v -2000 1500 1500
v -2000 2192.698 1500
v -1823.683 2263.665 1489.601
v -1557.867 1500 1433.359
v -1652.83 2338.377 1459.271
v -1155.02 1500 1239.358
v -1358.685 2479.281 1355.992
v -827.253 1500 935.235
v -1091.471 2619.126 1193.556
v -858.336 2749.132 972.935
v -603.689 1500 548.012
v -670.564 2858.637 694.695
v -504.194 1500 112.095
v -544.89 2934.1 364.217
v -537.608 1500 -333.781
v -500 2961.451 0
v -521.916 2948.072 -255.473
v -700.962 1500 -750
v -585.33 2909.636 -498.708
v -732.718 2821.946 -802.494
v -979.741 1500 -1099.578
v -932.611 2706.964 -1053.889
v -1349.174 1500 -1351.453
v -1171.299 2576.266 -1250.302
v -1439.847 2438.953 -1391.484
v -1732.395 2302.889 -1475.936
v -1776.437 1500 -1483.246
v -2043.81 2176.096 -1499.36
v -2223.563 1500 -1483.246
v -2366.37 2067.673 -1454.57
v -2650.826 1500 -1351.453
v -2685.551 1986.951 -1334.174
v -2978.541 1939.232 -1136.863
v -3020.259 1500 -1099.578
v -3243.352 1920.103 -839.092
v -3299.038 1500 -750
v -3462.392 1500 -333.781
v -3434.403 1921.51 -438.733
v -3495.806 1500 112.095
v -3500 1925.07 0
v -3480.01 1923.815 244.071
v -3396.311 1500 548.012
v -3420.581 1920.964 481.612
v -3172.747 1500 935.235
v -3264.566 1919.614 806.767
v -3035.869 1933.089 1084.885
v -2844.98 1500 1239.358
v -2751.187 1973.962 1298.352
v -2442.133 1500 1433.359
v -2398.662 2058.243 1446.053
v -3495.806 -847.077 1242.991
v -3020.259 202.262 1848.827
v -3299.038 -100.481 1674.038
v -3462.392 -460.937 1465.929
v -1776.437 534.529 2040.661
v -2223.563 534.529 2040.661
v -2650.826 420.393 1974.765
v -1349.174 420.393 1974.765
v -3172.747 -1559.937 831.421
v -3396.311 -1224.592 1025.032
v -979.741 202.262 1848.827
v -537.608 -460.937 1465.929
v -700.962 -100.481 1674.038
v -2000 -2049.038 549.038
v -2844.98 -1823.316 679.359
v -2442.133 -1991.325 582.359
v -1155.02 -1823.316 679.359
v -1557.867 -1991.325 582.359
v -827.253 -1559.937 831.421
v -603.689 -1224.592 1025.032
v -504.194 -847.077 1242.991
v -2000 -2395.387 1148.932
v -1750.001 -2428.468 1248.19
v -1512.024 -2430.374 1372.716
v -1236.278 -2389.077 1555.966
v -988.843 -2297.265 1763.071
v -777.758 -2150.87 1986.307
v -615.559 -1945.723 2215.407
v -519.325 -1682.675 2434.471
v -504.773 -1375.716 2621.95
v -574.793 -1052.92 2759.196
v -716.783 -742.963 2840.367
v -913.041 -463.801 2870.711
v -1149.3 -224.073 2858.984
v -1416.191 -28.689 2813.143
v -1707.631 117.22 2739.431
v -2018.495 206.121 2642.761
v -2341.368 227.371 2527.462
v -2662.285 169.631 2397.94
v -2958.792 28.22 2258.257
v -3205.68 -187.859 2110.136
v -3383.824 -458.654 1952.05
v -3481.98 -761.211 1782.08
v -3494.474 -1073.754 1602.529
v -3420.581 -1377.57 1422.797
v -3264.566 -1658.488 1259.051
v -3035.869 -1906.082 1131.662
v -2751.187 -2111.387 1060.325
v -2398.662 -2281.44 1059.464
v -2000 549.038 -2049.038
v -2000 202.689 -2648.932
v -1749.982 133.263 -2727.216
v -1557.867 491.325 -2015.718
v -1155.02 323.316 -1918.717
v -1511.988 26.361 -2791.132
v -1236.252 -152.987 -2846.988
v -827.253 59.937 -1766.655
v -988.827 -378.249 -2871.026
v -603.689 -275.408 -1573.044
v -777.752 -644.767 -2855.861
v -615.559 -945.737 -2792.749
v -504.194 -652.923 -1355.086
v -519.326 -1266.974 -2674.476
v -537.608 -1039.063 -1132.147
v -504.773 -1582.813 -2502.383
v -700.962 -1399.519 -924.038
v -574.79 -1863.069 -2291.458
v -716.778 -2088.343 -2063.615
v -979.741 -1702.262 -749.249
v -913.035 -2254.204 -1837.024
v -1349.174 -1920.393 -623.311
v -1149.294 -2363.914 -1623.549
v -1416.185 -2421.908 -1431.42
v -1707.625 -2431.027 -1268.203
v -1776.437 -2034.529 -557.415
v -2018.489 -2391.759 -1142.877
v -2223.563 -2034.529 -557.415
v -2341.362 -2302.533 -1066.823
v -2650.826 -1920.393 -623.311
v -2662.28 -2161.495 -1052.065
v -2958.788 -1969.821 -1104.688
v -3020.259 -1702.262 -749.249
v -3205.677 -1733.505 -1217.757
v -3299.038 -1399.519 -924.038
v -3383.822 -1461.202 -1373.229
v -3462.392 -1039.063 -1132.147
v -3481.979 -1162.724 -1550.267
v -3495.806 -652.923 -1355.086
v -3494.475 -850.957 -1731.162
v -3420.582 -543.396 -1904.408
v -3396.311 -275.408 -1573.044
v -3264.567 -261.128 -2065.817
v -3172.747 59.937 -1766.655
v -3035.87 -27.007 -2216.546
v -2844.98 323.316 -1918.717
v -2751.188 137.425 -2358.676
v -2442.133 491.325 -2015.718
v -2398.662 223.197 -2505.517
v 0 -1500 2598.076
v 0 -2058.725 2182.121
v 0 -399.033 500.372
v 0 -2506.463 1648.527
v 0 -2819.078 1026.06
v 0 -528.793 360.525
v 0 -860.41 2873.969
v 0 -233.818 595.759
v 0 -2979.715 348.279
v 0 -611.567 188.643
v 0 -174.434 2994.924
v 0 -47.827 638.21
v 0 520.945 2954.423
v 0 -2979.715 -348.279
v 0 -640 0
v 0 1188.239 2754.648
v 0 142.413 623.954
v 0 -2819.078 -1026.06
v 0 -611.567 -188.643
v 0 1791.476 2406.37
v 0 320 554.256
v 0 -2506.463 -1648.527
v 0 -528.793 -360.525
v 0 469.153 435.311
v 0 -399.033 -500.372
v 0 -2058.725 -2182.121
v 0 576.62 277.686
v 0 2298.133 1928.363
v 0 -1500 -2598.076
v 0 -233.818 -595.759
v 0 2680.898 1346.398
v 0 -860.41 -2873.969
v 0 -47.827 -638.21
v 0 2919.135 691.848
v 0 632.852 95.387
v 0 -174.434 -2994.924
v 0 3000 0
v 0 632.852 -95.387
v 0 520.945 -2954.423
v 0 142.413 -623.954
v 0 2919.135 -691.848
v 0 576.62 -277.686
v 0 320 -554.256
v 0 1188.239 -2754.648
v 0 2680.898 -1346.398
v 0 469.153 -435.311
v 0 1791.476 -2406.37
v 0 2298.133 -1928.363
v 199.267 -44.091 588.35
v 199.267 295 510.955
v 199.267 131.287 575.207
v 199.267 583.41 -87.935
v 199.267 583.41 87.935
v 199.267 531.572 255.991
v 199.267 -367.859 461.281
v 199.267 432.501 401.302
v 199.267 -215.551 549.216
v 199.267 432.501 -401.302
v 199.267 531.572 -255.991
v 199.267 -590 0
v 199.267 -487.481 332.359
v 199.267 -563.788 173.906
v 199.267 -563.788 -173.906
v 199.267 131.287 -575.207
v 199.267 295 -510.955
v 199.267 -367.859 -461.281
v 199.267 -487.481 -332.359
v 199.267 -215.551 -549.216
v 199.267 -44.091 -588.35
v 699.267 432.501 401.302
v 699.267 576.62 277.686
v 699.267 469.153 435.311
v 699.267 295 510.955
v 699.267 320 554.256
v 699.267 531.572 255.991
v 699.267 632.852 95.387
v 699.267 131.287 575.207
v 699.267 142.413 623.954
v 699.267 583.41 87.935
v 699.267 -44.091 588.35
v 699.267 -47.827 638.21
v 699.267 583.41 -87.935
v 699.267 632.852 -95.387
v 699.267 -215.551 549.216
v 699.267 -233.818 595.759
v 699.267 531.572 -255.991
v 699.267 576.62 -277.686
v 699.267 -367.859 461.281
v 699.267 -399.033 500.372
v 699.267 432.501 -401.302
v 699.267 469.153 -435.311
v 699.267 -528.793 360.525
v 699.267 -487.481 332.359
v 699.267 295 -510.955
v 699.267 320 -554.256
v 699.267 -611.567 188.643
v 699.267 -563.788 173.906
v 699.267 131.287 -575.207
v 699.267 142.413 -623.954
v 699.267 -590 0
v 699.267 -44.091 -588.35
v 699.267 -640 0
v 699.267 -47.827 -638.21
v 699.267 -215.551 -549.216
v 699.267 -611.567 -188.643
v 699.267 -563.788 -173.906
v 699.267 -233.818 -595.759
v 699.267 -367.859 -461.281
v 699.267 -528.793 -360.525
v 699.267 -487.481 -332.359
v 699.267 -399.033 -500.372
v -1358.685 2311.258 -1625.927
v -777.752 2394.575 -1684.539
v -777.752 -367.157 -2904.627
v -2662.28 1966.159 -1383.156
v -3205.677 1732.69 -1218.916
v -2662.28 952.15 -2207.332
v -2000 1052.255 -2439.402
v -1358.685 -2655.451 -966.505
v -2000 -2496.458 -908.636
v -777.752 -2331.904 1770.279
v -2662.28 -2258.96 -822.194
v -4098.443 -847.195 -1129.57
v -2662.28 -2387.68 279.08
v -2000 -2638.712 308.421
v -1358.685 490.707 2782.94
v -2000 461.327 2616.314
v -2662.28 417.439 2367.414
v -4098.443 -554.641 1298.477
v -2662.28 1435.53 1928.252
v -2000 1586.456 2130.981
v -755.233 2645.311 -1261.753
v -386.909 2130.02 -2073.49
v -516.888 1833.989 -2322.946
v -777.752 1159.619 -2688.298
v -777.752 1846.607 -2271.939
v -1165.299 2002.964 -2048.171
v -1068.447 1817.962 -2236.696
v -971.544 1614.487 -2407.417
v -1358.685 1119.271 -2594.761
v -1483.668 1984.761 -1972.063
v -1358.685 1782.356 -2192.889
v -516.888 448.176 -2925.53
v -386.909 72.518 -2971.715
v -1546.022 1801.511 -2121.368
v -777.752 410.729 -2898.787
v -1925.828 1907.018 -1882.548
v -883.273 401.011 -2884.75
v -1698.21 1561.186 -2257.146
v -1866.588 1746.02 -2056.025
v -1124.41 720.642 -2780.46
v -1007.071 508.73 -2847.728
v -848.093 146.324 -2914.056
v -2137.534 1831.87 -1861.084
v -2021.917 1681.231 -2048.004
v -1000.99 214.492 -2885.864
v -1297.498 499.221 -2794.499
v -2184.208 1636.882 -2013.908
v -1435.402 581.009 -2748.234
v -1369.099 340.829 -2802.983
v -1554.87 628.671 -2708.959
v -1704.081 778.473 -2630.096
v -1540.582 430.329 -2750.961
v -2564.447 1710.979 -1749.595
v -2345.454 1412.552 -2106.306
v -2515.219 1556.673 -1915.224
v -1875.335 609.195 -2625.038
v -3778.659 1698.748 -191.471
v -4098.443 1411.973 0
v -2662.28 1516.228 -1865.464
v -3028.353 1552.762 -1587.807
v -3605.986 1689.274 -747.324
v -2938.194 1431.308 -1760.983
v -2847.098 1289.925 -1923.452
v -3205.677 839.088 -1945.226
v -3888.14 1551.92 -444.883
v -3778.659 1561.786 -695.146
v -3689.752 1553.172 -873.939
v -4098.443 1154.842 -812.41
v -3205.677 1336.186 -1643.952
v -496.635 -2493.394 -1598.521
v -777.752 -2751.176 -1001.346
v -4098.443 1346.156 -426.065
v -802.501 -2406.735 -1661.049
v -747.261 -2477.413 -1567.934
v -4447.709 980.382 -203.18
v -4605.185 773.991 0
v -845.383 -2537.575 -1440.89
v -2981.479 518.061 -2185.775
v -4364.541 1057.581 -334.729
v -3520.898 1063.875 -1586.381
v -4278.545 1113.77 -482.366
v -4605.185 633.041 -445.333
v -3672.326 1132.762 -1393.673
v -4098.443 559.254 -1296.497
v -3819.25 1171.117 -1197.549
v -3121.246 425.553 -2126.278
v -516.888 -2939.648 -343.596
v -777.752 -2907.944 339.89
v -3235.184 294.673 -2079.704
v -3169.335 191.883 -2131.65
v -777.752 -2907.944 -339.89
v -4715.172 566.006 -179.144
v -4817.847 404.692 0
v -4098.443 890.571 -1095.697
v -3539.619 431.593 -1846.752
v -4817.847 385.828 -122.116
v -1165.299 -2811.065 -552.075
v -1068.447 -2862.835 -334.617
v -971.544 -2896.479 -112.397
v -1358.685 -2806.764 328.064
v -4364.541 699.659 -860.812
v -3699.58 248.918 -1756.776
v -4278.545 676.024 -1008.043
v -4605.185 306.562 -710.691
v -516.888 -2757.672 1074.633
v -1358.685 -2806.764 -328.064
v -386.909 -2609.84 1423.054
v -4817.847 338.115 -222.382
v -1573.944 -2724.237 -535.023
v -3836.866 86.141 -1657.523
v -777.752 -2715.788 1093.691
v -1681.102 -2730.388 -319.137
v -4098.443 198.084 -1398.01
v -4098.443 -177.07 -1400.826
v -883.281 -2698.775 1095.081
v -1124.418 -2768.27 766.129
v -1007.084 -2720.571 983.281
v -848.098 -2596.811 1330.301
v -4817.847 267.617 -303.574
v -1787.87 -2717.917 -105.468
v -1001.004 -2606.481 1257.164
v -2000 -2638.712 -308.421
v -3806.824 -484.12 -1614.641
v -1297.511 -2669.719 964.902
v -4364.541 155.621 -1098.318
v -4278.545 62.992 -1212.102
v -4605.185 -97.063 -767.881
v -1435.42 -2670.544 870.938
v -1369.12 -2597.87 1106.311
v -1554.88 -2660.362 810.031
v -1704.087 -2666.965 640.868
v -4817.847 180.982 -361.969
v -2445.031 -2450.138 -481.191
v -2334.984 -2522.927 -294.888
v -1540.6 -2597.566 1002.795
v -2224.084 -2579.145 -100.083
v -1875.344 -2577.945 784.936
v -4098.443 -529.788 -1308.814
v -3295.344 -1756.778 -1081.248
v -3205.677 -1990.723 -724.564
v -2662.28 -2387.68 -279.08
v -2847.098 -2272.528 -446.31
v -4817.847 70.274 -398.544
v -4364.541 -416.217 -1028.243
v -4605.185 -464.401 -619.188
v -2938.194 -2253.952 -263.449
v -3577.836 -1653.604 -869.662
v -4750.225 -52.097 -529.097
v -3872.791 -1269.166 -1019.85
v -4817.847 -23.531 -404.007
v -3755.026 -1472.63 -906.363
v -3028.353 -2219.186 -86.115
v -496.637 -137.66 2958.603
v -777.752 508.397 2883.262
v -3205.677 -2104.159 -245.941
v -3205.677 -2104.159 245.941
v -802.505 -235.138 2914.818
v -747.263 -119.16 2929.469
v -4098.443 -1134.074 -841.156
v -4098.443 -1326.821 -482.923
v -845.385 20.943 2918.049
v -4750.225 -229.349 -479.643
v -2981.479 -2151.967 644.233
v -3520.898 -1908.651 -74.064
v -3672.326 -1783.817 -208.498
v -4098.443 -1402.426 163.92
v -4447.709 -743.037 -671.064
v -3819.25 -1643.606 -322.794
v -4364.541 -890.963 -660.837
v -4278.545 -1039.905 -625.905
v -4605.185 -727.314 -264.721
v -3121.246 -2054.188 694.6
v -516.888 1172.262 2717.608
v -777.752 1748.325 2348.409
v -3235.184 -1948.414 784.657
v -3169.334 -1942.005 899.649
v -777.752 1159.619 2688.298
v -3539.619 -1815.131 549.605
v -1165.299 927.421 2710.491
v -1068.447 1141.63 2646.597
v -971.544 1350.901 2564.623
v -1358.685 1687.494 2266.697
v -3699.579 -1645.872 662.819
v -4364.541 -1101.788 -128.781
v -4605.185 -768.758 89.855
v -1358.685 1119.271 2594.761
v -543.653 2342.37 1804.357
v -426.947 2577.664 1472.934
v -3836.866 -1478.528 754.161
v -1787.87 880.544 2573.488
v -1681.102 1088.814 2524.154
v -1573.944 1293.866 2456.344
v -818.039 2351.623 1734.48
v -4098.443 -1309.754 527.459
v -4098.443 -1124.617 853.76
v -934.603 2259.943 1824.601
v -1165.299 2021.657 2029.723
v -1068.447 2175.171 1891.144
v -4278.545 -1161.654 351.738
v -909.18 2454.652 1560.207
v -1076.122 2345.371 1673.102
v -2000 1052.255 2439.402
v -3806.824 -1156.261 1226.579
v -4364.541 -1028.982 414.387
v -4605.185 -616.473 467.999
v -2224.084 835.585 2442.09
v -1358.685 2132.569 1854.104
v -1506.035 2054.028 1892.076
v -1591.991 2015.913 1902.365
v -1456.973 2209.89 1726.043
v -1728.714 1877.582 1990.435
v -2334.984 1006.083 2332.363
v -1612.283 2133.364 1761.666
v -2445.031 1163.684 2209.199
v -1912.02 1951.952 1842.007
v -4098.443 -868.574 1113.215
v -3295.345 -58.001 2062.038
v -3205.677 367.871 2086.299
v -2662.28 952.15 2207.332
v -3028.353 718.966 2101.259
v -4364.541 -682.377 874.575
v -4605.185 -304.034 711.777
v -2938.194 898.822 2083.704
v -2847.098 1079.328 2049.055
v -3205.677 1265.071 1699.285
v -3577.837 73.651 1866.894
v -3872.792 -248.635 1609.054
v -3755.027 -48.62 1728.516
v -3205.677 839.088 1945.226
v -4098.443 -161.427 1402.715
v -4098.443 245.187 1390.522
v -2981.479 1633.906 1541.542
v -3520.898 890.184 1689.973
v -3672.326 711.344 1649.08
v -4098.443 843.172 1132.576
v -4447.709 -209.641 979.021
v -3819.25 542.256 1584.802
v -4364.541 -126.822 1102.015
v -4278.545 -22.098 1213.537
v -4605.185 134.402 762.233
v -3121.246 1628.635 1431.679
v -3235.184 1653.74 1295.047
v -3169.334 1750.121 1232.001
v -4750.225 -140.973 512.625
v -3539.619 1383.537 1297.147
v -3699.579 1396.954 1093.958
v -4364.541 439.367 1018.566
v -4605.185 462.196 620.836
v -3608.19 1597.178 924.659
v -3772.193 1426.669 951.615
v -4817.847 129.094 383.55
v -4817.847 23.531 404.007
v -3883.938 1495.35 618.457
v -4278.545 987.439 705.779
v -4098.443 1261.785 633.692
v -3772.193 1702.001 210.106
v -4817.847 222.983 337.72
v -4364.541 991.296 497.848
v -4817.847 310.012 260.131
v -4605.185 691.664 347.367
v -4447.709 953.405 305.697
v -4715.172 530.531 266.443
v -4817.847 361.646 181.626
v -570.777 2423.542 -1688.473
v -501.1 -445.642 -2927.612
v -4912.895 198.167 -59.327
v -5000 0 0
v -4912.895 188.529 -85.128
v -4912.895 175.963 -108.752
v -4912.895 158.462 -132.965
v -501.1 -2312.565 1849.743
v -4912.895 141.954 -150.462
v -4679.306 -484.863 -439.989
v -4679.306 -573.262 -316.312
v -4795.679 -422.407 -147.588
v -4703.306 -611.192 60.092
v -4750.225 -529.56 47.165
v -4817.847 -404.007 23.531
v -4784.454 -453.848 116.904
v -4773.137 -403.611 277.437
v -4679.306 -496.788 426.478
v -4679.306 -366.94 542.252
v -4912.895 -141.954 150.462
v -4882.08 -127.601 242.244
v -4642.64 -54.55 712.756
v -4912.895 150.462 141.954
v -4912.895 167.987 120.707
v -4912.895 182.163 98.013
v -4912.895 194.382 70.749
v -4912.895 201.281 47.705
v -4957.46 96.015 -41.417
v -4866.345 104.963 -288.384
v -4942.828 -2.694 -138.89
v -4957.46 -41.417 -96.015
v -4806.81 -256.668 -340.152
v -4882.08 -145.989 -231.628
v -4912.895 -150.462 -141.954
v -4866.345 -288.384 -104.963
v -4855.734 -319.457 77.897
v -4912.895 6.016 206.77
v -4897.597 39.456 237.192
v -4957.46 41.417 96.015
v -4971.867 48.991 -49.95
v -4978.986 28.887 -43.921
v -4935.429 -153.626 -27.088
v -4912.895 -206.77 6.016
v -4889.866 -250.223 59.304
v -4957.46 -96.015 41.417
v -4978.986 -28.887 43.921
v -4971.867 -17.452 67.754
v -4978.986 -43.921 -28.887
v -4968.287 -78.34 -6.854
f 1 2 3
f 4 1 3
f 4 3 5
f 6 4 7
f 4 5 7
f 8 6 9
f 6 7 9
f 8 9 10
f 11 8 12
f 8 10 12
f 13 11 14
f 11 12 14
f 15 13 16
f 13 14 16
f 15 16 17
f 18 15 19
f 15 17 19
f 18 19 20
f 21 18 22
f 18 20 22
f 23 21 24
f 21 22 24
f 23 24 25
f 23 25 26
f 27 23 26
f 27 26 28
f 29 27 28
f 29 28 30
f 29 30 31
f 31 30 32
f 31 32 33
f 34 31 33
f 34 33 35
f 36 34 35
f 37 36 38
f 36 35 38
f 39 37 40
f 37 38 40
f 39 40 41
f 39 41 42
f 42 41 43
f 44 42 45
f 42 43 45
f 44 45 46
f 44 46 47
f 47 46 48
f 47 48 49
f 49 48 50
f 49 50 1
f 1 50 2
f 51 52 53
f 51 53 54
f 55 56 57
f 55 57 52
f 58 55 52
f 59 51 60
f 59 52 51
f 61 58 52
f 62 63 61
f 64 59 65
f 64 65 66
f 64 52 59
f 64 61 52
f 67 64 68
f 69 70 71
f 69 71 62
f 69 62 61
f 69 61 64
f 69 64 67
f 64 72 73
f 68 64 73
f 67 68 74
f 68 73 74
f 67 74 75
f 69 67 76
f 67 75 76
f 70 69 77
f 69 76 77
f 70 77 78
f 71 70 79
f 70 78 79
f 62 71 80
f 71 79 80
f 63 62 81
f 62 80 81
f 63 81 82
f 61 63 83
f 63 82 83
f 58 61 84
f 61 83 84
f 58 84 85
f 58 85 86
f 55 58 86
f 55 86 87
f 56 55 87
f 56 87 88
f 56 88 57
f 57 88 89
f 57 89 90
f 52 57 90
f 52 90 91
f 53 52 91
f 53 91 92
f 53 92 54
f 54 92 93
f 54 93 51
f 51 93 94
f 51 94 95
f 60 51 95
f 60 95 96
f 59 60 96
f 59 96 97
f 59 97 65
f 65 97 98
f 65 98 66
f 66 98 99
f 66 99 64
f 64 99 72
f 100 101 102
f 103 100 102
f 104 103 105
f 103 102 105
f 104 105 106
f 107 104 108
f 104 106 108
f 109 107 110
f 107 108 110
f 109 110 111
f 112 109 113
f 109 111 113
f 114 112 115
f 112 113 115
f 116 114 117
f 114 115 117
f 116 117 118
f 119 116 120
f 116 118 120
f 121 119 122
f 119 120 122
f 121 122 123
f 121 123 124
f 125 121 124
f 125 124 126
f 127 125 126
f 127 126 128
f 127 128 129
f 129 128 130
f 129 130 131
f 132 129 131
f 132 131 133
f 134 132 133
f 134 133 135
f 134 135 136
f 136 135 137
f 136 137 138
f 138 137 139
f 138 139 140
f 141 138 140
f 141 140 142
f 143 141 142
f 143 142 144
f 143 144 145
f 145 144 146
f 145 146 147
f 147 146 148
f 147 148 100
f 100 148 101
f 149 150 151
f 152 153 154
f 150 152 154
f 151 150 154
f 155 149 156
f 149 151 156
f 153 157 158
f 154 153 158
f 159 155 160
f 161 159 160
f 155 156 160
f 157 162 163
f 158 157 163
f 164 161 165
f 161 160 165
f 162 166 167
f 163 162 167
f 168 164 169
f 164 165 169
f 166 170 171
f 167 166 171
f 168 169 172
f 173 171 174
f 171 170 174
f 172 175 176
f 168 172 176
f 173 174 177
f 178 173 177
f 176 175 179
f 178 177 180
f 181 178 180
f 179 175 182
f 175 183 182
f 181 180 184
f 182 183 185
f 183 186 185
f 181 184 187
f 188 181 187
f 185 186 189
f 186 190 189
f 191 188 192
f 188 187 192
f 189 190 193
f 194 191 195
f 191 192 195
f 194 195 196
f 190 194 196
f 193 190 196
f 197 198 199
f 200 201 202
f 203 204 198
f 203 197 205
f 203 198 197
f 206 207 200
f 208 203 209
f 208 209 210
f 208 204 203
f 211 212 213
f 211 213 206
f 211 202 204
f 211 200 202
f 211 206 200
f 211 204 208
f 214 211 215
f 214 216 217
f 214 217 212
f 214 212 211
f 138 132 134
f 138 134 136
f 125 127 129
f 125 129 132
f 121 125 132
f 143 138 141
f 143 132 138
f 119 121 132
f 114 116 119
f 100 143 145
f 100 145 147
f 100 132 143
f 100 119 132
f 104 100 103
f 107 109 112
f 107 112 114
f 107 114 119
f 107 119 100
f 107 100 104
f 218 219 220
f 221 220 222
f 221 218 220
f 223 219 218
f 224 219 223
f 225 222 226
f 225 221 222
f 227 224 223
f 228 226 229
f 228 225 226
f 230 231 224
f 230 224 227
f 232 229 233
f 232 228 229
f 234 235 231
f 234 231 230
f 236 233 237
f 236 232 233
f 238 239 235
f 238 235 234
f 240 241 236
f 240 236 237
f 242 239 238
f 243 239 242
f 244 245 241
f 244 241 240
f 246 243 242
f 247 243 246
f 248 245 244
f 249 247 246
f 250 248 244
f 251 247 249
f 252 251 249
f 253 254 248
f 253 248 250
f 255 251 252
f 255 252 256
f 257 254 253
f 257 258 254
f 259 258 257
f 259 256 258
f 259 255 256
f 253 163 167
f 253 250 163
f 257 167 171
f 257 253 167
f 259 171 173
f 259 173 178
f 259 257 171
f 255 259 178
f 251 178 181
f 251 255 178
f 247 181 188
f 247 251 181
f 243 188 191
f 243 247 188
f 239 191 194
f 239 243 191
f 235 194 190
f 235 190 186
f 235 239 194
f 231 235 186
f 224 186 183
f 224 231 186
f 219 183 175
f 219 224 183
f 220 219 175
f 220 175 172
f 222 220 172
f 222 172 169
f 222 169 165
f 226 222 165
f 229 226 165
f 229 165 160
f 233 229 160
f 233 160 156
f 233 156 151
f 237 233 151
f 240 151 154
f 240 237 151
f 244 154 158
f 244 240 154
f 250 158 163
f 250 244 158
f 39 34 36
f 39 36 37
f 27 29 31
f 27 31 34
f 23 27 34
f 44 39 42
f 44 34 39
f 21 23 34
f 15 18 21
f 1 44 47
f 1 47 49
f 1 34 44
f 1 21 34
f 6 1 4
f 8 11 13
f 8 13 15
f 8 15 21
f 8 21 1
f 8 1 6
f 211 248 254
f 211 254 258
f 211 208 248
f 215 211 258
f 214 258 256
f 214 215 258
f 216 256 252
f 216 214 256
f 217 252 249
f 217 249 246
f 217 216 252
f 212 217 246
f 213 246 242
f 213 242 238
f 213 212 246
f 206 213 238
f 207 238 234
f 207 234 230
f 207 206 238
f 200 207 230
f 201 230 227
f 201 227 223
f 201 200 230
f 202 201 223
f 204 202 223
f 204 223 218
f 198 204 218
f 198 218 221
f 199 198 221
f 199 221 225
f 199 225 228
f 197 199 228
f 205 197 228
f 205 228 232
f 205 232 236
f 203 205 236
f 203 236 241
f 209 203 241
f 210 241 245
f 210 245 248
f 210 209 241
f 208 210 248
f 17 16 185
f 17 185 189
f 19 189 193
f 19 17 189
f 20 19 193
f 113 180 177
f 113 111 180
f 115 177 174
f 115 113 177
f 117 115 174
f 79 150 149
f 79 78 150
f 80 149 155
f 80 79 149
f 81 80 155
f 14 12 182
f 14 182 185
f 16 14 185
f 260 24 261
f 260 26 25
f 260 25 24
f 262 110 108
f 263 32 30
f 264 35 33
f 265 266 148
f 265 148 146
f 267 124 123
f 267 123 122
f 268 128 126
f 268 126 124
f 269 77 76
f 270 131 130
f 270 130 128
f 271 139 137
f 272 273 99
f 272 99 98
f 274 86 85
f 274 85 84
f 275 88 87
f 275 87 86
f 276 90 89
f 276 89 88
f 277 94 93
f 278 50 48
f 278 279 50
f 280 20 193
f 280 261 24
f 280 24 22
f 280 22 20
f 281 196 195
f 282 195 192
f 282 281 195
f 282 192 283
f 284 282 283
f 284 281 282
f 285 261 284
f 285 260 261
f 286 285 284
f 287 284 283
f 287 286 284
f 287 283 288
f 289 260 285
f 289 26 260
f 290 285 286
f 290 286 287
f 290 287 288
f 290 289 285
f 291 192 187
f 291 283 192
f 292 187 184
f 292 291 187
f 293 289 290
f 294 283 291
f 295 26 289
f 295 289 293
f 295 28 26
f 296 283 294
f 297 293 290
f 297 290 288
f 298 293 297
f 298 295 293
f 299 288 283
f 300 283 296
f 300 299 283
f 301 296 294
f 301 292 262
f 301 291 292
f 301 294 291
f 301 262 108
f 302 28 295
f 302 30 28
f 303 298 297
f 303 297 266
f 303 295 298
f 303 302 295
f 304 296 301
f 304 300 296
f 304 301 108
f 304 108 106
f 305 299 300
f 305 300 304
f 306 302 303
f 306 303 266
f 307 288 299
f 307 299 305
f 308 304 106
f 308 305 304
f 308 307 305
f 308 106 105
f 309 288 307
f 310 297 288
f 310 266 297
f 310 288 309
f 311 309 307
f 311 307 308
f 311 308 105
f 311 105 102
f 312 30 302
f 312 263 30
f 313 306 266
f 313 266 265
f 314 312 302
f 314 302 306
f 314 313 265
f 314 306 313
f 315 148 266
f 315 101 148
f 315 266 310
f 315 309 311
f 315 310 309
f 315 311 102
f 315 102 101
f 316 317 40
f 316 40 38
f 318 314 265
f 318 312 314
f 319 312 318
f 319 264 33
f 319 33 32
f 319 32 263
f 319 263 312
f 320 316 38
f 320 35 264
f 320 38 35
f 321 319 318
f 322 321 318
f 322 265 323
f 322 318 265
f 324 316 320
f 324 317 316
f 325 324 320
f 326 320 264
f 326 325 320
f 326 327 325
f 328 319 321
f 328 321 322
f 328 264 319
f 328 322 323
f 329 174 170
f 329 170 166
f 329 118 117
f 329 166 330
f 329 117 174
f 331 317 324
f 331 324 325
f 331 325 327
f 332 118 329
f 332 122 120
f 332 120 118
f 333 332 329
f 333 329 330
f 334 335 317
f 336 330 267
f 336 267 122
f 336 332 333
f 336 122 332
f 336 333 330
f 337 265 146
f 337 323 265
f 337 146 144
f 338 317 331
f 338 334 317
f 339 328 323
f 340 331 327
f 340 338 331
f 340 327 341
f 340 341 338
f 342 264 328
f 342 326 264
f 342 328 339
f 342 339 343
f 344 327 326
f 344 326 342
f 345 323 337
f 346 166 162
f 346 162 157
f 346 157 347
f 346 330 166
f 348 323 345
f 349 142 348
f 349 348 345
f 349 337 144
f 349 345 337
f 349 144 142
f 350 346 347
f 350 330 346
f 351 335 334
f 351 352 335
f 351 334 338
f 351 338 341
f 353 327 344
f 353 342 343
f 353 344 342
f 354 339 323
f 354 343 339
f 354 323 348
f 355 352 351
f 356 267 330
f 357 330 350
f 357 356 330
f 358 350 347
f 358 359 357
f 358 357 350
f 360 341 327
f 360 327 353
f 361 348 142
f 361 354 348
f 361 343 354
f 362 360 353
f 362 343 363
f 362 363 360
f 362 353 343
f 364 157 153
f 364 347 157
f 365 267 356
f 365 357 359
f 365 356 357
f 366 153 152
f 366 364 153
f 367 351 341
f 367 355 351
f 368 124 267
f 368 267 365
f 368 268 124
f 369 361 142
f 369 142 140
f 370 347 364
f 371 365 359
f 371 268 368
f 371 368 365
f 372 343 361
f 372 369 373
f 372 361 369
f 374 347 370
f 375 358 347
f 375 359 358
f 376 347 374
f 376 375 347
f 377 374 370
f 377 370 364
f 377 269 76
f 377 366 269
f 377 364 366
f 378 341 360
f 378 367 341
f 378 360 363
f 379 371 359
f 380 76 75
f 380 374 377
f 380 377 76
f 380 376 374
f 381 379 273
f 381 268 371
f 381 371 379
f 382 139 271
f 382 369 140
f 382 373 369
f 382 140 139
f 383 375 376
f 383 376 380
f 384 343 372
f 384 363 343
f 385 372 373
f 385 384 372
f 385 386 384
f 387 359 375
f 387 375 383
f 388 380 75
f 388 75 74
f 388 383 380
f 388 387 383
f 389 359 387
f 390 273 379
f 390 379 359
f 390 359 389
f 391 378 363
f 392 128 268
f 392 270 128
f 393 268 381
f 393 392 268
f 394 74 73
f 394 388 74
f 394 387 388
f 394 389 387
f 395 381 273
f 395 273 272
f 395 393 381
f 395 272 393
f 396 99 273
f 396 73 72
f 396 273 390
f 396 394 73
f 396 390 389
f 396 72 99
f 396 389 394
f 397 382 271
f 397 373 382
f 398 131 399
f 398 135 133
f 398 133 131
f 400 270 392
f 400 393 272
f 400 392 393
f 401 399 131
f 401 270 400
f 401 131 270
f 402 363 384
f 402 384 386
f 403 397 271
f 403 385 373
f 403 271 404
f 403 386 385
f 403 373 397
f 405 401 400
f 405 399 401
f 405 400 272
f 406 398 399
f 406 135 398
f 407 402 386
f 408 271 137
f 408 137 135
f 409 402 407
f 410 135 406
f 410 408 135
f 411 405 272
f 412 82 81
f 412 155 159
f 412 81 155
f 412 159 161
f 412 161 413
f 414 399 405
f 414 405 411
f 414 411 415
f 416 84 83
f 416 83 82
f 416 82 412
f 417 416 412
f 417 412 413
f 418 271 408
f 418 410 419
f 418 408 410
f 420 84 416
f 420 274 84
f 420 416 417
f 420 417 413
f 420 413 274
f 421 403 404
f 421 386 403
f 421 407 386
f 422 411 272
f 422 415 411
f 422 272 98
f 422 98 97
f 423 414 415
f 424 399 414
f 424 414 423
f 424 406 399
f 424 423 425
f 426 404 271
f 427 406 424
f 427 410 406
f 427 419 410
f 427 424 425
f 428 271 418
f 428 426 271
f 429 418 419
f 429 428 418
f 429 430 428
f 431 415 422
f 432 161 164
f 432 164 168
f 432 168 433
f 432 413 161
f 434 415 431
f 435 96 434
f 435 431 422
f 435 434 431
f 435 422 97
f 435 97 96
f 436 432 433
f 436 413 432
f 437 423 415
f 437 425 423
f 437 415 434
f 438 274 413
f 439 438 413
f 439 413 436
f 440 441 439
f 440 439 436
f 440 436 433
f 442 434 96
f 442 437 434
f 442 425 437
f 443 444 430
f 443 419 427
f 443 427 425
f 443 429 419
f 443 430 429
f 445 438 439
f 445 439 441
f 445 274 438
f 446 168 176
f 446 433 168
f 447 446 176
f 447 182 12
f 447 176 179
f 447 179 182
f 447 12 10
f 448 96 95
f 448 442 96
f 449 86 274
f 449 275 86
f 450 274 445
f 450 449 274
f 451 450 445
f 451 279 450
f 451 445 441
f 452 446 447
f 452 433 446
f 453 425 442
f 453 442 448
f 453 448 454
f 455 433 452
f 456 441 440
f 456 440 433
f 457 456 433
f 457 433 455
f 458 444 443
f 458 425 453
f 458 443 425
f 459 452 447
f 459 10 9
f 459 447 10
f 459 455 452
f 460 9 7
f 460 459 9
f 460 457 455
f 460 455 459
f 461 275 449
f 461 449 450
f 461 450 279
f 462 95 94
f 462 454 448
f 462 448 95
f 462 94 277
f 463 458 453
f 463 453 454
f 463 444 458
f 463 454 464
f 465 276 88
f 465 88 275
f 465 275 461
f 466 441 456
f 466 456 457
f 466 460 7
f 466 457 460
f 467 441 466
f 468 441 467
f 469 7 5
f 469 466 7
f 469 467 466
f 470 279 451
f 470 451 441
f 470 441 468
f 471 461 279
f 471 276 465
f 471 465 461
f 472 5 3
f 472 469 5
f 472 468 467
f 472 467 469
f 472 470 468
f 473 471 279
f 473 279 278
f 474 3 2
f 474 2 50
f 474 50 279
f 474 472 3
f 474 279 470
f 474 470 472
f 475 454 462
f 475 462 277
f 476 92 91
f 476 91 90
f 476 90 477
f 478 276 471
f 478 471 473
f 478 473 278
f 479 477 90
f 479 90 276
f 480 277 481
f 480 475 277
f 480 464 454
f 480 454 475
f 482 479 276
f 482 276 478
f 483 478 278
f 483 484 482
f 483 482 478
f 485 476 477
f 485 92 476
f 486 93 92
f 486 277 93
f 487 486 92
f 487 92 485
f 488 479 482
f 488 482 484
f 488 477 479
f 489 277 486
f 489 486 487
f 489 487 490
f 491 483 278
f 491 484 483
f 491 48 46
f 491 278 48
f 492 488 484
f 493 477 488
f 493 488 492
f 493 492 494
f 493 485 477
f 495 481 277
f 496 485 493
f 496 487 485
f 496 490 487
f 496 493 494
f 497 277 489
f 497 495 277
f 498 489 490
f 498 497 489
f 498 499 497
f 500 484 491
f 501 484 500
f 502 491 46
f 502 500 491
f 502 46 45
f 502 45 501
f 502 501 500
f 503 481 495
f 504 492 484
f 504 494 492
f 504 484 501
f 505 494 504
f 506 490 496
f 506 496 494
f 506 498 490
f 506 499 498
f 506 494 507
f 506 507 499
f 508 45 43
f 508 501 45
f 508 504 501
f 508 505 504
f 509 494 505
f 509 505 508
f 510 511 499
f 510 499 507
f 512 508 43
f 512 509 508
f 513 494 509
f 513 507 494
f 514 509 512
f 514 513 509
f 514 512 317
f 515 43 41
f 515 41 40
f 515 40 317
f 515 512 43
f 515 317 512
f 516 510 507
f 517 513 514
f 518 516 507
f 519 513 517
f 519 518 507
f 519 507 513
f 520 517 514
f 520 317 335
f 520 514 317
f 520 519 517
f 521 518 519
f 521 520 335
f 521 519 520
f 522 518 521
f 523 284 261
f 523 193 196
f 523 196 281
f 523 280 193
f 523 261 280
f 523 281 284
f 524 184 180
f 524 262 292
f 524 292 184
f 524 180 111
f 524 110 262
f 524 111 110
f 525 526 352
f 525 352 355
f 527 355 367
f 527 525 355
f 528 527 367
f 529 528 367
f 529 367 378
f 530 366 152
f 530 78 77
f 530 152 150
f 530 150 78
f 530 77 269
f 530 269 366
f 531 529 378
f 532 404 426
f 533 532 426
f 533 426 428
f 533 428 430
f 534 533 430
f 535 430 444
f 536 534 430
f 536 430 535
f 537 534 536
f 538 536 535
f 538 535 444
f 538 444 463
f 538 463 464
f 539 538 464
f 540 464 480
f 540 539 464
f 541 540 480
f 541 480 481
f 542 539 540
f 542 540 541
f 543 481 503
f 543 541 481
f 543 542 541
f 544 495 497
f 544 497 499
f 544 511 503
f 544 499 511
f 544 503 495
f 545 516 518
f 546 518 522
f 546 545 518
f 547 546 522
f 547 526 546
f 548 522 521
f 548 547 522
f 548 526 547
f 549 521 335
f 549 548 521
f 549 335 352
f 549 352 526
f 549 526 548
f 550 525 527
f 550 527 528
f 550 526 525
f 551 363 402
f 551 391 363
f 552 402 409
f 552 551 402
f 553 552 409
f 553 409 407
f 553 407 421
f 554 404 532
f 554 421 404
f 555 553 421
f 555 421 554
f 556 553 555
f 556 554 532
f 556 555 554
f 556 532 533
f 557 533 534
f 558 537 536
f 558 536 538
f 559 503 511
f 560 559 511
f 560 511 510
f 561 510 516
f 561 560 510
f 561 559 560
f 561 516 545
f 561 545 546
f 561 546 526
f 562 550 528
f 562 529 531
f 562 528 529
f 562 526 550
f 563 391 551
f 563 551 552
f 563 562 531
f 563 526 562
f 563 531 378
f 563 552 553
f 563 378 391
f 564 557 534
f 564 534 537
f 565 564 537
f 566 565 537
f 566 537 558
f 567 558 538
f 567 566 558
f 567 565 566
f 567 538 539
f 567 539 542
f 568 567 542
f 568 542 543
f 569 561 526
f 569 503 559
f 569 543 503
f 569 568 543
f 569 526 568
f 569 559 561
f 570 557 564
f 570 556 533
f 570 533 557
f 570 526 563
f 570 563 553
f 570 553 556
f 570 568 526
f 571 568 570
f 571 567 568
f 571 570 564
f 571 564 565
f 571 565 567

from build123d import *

# Parameters (mm, degrees)
SKETCH2_R          = 1500
CUT_EXTRUDE1_DEPTH = 1500
CIRPATTERN1_COUNT  = 3


with BuildPart() as part:
    # Sketch1 → Revolve1 (revolve)
    with BuildSketch(Plane.XY):
        with BuildLine():
            Line((0, 0), (-5000, 0))
            add(Edge.make_bspline(
                [(0, 3000), (-1941.232650508, 2903.079546126), (-4138.125517244, 2194.727419517), (-5000, 0)],
                knots=[0, 0, 0, 0, 1, 1, 1, 1], degree=3))
            Line((0, 3000), (0, 0))
        make_face()
    revolve(axis=Axis((0, 0, 0), (-1, 0, 0)))

    # Sketch2 → Cut-Extrude1 (cut)
    with BuildSketch(Plane(origin=(0, 3000, 0), x_dir=(1, 0, 0), z_dir=(0, 1, 0))):
        with Locations(Location((-2000, 0, 0), (0, 0, 270))):
            Circle(SKETCH2_R)
    cut_extrude1 = extrude(amount=-CUT_EXTRUDE1_DEPTH, mode=Mode.SUBTRACT)

    # CirPattern1: Cut-Extrude1 ×3 about axis
    cirpattern1_axis = Axis((0, 0, 0), (1, 0, 0))
    for i in range(1, CIRPATTERN1_COUNT):
        add(cut_extrude1.rotate(cirpattern1_axis, i * 360 / CIRPATTERN1_COUNT), mode=Mode.SUBTRACT)

    # Sketch5 → Revolve2 (revolve)
    with BuildSketch(Plane(origin=(0, 0, 0), x_dir=(-1, 0, 0), z_dir=(0, -0.8660254037844363, -0.5000000000000043)), mode=Mode.PRIVATE) as revolve2_sk:
        Polygon((0, 0), (0, 640), (-699.266659893, 640), (-699.266659893, 590), (-199.266659893, 590), (-199.266659893, 0), align=None)
    revolve(revolve2_sk.sketch.rotate(Axis((0, 0, 0), (1, 0, 0)), 240), axis=Axis((0, 0, 0), (1, 0, 0)))


solid = part.part
